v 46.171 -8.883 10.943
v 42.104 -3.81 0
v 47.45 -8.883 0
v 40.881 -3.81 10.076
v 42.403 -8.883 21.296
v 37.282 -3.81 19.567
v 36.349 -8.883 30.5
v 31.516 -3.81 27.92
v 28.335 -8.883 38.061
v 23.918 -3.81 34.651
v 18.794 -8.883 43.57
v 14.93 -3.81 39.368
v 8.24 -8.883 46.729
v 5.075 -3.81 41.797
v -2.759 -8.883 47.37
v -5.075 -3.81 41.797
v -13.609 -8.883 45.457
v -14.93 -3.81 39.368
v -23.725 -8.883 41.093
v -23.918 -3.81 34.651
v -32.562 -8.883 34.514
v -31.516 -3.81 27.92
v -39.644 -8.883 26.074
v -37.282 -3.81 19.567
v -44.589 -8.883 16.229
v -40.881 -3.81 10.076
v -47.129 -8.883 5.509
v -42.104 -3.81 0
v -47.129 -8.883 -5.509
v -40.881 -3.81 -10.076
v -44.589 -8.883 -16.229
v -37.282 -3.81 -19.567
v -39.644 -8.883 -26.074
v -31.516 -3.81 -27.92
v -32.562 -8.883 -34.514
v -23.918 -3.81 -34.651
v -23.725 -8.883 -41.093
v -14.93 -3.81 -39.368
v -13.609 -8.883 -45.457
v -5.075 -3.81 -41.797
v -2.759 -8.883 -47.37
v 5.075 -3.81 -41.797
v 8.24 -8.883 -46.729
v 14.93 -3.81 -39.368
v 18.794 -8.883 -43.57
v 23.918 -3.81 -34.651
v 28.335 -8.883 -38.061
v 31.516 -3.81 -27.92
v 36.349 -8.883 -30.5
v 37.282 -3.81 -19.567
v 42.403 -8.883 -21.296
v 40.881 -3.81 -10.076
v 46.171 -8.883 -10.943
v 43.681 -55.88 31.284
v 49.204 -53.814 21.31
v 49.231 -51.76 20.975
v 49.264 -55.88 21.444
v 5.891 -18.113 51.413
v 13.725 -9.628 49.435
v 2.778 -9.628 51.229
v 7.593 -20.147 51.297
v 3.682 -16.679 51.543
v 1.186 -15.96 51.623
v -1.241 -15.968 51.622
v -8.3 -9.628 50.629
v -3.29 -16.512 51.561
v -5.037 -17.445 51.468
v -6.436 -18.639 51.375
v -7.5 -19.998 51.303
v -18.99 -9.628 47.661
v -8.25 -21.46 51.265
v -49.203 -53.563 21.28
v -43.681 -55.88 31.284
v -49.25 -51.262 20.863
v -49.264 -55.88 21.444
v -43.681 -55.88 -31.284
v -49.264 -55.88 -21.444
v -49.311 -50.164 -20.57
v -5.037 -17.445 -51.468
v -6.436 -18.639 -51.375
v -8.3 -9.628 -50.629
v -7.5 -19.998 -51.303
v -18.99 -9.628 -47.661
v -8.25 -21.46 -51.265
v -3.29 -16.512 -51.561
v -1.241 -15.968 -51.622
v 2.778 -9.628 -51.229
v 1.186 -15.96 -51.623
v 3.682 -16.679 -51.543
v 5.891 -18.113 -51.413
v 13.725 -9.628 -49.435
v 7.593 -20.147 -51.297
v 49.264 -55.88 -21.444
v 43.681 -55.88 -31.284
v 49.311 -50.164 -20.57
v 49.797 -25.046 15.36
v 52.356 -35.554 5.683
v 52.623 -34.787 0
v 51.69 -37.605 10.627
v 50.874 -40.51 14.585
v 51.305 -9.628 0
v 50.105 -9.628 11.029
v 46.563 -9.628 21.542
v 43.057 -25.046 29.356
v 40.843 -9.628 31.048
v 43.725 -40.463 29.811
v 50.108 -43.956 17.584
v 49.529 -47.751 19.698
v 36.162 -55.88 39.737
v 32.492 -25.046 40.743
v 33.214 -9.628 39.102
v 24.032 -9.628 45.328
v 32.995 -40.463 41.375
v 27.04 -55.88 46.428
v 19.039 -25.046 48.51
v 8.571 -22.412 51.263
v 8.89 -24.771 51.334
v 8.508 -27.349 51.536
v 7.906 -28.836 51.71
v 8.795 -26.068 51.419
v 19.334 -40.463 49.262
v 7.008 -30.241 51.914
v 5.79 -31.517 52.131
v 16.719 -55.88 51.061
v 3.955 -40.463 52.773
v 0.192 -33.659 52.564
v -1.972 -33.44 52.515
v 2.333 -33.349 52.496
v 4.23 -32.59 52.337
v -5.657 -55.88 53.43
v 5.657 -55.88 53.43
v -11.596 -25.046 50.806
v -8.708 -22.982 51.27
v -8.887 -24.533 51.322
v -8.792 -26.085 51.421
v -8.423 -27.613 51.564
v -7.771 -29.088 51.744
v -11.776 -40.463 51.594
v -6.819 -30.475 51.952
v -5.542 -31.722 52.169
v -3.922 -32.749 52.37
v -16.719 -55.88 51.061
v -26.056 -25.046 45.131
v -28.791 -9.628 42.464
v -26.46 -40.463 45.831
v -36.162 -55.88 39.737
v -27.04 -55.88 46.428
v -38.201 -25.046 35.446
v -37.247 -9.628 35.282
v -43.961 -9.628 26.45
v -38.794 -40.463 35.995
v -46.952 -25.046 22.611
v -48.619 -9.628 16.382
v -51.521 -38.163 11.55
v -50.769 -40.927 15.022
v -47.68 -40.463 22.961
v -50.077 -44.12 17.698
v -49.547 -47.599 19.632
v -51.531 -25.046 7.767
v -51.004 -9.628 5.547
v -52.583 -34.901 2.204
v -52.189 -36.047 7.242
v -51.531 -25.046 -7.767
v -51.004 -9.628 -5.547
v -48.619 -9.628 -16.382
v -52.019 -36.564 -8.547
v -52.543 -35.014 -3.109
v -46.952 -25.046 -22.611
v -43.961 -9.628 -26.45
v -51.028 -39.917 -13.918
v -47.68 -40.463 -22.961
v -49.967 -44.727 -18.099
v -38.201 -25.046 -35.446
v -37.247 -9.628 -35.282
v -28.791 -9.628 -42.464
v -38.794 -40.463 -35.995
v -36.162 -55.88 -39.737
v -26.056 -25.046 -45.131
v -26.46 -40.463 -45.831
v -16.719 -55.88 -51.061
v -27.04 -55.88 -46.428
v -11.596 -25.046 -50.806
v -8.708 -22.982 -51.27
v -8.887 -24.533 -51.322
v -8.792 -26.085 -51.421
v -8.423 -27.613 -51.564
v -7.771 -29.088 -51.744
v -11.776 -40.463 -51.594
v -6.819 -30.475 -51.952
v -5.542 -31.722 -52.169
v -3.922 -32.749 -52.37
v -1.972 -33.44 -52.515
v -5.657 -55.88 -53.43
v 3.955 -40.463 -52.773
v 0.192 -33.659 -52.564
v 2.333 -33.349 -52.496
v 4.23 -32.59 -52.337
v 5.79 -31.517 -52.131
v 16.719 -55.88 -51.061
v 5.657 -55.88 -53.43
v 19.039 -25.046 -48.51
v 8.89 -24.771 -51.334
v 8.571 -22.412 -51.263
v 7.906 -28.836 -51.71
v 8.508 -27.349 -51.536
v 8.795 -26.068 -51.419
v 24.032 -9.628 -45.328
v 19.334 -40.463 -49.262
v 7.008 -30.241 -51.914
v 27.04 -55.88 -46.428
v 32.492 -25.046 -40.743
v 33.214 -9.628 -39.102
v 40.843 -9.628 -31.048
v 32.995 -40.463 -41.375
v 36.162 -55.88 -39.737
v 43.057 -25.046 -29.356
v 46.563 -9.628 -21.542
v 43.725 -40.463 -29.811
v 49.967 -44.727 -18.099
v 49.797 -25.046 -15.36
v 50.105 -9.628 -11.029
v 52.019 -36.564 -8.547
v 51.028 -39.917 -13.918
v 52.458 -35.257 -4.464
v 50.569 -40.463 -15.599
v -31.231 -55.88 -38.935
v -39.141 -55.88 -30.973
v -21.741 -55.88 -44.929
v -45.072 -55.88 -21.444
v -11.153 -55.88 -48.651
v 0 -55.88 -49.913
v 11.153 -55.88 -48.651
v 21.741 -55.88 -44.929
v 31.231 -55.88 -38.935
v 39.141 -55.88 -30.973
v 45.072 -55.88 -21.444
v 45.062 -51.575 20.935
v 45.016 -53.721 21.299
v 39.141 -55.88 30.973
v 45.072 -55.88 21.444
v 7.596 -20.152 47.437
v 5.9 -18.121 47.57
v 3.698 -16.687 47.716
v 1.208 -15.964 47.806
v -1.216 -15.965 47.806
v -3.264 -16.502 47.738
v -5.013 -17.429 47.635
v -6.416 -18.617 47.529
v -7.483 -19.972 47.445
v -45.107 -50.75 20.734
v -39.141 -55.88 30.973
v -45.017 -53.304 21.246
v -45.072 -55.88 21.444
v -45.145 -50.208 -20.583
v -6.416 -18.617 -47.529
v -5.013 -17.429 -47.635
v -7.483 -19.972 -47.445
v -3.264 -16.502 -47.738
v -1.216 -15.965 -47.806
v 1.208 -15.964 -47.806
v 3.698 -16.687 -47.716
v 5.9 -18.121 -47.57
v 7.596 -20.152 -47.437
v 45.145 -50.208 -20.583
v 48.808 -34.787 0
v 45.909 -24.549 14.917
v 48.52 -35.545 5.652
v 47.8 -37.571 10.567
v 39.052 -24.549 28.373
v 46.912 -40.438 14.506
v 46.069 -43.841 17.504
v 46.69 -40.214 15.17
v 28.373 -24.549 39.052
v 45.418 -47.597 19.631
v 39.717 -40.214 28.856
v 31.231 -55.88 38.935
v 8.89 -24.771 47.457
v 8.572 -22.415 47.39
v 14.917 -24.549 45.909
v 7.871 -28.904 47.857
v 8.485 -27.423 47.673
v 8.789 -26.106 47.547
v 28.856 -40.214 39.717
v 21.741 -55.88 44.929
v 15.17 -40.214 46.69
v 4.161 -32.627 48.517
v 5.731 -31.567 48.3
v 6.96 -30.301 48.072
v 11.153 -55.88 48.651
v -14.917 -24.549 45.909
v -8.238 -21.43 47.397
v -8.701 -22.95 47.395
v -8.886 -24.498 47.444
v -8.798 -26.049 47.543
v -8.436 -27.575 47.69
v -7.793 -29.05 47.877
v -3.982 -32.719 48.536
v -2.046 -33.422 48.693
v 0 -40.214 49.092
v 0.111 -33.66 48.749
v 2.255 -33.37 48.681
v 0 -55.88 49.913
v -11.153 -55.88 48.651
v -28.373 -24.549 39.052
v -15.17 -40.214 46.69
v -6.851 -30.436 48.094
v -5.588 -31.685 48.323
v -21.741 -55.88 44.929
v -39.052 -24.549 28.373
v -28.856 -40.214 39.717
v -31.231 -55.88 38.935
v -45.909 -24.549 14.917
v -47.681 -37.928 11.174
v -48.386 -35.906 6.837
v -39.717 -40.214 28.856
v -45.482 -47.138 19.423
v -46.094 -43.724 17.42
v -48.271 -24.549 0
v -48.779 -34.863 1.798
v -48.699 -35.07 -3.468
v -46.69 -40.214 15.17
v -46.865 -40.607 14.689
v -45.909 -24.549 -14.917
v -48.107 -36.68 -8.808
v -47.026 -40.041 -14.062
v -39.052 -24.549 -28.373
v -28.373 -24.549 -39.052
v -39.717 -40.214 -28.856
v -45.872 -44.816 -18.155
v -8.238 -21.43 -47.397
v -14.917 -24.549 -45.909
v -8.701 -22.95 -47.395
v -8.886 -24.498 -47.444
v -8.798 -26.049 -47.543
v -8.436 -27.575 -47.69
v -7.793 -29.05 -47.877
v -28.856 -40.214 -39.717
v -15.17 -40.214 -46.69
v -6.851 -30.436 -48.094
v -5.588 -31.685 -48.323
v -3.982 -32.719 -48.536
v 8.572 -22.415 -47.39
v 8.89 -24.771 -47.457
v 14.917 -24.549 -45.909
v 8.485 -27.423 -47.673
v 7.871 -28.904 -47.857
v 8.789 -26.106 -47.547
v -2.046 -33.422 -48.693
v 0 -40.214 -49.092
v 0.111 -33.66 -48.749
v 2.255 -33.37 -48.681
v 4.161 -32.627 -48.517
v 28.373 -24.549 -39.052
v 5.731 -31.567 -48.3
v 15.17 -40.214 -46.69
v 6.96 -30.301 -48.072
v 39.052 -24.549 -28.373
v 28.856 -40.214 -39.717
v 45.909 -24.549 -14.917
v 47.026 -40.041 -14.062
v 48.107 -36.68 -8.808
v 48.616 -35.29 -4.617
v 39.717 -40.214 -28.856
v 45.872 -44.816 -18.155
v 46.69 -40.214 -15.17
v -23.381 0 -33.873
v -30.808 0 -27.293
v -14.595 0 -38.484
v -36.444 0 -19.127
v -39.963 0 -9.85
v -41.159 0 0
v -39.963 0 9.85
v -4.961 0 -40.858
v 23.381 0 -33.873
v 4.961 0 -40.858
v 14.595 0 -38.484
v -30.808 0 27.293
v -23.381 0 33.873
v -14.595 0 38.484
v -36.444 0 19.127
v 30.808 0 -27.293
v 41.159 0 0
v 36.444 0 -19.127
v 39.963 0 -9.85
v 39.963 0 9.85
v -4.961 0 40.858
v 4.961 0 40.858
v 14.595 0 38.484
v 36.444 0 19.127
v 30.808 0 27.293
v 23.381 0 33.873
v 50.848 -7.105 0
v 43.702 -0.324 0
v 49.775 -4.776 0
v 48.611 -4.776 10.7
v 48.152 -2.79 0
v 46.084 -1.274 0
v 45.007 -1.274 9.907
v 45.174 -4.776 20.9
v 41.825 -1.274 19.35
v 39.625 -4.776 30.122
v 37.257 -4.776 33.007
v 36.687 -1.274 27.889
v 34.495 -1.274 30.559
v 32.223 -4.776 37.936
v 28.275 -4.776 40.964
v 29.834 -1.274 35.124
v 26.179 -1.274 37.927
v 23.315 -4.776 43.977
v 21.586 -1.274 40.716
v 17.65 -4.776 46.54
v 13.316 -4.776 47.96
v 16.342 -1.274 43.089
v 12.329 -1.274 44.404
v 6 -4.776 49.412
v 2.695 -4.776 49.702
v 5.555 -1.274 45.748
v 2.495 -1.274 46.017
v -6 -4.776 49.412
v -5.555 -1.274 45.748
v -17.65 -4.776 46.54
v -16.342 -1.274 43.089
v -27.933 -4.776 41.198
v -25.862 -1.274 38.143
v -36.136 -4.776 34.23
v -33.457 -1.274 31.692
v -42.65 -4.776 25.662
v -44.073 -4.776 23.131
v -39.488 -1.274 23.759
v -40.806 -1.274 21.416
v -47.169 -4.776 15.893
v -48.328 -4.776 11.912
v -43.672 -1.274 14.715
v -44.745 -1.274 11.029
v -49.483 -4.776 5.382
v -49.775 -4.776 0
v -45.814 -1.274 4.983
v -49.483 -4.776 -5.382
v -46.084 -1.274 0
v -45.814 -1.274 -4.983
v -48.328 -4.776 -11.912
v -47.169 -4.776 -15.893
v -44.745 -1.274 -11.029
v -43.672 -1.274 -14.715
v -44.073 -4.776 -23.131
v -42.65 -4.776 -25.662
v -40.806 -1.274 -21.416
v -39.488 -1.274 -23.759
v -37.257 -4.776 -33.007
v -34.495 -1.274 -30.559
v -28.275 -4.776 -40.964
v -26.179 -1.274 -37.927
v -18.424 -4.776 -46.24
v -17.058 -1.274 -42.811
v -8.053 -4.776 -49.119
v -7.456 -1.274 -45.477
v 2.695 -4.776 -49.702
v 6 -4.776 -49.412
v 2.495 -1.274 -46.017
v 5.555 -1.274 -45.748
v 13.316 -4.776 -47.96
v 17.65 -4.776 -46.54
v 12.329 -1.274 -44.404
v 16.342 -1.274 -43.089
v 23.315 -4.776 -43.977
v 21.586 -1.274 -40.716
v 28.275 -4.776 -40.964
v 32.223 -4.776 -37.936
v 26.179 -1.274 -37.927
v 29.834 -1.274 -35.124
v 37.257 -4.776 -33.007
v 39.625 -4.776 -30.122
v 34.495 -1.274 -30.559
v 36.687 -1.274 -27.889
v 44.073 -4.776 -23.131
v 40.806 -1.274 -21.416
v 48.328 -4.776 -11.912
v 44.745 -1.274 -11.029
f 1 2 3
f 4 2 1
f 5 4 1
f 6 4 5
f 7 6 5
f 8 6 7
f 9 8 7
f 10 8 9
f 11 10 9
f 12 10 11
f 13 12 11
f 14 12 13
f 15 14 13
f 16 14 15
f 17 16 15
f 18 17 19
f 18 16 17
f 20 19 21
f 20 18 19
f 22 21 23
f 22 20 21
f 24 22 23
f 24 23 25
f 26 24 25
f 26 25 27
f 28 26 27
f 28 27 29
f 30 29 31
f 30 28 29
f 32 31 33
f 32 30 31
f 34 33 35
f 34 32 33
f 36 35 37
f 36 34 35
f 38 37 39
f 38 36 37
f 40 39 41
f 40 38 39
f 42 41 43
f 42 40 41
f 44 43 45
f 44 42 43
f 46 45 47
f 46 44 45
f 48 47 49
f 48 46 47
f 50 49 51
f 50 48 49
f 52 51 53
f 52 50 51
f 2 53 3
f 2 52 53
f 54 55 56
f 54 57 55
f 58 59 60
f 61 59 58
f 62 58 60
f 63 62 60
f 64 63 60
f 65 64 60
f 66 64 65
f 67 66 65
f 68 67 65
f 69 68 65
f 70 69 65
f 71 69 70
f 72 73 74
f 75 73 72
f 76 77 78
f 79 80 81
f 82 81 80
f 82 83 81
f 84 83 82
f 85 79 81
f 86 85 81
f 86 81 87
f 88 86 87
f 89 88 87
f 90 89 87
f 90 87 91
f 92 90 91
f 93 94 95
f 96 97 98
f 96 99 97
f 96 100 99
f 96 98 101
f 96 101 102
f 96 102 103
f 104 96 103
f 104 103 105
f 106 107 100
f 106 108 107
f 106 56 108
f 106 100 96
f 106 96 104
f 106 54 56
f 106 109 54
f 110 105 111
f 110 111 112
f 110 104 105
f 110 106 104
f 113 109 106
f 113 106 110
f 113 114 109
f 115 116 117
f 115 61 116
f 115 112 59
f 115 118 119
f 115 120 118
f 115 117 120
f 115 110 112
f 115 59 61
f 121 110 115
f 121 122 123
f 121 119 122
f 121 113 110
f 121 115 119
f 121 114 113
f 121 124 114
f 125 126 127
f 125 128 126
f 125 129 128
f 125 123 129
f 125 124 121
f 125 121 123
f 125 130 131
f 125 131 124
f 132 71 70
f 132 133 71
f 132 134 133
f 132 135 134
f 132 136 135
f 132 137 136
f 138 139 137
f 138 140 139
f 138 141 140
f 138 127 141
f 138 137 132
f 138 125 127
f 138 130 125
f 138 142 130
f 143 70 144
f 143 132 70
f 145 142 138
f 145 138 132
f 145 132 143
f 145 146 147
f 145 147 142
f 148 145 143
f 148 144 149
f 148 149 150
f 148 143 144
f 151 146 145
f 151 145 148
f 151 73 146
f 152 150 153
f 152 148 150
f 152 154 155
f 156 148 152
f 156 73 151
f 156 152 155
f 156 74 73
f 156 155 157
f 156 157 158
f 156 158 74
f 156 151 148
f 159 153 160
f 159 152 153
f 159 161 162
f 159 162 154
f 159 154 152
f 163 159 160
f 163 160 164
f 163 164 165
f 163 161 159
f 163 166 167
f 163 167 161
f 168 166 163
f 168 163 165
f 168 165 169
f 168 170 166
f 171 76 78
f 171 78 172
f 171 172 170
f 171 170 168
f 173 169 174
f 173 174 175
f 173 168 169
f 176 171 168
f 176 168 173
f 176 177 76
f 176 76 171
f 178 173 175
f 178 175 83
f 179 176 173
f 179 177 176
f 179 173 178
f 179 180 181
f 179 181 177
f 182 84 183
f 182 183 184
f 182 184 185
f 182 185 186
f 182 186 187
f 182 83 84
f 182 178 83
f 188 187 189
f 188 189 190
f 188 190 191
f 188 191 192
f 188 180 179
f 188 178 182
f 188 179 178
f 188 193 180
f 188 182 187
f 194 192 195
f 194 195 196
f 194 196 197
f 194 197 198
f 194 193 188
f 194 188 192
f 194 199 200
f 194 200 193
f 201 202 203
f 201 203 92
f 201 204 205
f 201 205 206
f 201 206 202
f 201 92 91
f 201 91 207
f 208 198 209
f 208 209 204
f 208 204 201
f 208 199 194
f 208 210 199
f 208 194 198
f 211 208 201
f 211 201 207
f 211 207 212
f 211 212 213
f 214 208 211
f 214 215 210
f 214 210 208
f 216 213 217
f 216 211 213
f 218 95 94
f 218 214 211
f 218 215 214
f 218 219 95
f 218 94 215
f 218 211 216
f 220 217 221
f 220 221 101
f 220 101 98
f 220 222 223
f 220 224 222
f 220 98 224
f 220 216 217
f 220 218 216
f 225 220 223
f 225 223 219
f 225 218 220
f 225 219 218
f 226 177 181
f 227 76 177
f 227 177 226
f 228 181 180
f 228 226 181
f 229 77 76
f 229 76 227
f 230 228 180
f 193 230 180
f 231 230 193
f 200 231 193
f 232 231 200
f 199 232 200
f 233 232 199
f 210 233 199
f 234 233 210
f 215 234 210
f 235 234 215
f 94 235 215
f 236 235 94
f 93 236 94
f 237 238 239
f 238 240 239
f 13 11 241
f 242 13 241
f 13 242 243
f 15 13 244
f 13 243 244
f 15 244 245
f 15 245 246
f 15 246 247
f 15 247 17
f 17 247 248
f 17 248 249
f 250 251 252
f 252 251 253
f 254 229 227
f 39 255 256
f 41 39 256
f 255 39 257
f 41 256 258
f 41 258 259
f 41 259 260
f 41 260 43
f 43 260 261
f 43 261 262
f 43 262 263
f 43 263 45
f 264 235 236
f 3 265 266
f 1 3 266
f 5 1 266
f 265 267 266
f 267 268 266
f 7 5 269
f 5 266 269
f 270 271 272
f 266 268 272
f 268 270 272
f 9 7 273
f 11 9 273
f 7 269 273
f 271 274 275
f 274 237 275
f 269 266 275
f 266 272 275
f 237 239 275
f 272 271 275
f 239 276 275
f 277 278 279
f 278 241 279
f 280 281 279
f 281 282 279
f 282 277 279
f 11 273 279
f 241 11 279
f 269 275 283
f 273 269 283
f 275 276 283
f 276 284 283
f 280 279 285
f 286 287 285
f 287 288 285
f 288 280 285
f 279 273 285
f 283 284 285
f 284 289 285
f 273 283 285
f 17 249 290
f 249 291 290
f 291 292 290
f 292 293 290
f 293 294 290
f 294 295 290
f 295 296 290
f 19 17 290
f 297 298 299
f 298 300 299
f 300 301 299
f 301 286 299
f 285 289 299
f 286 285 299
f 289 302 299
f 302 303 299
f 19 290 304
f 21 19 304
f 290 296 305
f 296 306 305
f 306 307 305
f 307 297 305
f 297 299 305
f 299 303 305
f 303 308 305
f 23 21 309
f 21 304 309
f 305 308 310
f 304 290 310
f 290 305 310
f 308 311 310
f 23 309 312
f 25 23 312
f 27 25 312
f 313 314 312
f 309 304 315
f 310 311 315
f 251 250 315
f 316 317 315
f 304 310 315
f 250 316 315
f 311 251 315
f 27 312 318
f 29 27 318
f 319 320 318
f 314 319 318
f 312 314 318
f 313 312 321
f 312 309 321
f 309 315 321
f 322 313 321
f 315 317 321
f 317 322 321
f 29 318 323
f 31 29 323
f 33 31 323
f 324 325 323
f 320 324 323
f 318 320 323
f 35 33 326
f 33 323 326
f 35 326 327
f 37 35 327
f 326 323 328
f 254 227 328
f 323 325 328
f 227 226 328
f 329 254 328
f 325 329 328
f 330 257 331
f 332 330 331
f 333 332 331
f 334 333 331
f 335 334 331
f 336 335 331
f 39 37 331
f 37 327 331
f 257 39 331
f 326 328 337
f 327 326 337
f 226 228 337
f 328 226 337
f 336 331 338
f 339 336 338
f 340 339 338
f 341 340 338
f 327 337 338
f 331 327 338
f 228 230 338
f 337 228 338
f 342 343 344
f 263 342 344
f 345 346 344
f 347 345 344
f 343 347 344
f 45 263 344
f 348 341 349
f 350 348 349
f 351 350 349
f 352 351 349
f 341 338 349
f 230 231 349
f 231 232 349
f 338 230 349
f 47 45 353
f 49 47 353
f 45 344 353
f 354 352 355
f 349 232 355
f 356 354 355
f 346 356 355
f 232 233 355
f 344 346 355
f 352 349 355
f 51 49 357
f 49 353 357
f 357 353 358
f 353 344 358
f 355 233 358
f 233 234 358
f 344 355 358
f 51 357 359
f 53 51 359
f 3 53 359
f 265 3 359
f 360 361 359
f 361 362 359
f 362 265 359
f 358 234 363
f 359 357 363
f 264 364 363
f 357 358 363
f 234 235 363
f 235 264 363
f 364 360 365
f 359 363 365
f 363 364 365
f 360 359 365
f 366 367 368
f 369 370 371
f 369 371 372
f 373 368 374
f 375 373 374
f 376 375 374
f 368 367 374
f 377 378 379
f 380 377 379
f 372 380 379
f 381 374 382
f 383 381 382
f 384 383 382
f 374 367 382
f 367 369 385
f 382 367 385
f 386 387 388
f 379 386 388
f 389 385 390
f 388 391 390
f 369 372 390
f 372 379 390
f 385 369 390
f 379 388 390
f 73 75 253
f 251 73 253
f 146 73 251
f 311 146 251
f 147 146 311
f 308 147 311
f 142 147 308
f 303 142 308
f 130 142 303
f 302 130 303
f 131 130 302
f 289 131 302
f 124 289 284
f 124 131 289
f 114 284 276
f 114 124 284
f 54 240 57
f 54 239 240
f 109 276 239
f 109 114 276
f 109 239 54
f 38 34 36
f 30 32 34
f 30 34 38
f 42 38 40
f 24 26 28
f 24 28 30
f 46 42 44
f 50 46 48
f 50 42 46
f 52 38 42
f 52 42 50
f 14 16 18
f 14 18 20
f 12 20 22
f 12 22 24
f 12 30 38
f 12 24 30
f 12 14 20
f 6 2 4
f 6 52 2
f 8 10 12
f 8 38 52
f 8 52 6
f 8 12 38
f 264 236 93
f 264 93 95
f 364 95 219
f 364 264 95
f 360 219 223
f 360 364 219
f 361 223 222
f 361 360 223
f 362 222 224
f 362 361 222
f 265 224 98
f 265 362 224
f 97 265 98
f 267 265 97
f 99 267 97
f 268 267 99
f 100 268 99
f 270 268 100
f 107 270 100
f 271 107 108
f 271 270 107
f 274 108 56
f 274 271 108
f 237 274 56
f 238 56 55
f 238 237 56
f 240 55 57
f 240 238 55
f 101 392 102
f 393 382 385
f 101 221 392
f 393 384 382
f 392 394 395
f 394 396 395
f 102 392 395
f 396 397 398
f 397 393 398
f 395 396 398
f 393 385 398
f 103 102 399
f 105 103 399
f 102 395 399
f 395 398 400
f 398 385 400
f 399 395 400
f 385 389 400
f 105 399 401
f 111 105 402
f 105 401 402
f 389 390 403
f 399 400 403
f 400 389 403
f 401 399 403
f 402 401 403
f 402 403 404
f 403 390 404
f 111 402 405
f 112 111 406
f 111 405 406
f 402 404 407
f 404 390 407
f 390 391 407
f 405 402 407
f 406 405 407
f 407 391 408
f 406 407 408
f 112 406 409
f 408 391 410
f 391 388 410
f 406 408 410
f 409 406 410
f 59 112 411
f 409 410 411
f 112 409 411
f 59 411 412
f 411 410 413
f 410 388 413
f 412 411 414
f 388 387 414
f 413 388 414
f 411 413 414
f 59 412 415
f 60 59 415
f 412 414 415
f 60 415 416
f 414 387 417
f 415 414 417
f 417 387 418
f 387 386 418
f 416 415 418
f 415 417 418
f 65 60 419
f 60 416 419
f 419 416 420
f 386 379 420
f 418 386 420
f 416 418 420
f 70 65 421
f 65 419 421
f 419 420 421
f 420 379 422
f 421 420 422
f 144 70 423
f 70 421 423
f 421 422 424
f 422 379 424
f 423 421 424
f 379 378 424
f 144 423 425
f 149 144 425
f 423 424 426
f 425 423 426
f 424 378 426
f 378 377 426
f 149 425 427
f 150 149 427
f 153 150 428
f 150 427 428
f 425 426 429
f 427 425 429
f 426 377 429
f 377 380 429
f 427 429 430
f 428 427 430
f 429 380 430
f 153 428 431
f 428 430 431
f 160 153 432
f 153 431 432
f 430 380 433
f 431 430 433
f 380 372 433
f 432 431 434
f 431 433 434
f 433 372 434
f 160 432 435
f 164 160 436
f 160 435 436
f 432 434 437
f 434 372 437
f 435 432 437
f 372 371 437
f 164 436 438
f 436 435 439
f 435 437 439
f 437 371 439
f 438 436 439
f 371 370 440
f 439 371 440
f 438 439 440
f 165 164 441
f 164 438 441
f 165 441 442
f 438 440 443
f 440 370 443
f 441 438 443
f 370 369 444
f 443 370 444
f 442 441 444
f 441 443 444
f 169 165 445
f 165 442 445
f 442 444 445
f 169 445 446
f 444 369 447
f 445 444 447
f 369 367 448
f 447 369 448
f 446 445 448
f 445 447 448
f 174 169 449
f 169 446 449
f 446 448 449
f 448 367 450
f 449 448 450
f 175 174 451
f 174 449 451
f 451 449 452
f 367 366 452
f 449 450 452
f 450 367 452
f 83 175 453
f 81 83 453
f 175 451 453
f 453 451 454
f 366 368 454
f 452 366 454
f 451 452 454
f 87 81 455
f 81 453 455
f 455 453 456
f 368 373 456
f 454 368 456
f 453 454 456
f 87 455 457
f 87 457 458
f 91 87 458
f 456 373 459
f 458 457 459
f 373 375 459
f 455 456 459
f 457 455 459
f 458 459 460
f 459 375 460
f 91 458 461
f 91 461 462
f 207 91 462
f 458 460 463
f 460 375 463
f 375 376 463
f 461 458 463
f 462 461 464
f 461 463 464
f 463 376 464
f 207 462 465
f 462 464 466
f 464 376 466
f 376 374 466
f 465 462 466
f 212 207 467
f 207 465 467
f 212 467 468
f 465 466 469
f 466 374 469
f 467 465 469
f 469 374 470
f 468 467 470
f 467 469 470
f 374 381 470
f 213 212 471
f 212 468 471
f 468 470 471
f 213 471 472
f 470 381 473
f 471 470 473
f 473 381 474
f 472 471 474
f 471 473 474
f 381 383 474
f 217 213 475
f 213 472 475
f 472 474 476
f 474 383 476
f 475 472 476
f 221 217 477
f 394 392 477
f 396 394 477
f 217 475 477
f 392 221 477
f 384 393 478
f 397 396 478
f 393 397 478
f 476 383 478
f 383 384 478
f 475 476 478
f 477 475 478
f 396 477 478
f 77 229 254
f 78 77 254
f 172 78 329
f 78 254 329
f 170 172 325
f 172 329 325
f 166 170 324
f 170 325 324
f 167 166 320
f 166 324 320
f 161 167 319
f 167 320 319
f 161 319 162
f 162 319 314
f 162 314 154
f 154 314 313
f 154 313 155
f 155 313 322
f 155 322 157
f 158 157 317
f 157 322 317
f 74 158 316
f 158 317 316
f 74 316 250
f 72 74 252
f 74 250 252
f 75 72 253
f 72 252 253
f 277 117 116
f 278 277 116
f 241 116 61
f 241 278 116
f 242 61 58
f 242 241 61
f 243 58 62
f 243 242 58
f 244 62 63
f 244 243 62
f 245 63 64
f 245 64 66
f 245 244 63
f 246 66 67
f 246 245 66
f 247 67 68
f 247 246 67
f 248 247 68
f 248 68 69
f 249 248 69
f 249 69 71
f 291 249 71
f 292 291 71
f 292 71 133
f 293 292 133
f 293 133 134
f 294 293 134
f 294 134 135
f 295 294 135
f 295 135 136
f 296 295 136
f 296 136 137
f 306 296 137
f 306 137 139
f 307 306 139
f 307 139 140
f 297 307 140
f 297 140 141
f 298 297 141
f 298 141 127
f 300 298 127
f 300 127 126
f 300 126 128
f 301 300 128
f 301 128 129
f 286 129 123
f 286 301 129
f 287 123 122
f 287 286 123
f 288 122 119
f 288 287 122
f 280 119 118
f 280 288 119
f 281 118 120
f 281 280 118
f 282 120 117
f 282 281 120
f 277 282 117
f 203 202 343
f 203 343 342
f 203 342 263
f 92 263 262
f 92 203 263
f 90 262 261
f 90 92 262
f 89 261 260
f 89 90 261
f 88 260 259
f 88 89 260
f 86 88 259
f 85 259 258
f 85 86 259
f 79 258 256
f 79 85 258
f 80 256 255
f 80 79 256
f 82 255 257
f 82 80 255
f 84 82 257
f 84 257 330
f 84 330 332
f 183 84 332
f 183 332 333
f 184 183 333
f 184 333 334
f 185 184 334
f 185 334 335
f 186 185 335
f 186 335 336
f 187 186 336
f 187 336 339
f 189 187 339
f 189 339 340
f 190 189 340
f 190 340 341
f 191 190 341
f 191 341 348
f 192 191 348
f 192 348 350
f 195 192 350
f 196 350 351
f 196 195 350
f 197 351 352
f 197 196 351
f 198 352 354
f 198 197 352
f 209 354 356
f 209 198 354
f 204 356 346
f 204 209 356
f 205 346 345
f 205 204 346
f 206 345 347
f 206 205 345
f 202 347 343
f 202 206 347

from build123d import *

# Parameters (mm, degrees)
F0_R          = 50.8
F1_DEPTH      = 55.88
F1_TAPER      = -3
F2_T          = -3.81
F4_R          = 21.44690309
F5_DEPTH      = 58.166
F5_DEPTH_BACK = 65.786
F6_R          = 10.16
F7_SIZE       = 5.08
F9_R          = 8.89
F10_DEPTH     = 133.858


with BuildPart() as f1:
    # F0 (on Front) → F1 (new body)
    with BuildSketch(Plane.XZ):
        Circle(F0_R)
    extrude(amount=F1_DEPTH, taper=F1_TAPER)

    # F2
    f2_openings = [f1.faces().sort_by_distance(p)[0] for p in [
        (0, -55.88, 0),
    ]]
    offset(amount=F2_T, openings=f2_openings, kind=Kind.INTERSECTION)

    # F4 (on Right) → F5 (cut, two sides)
    with BuildSketch(Plane.YZ) as f5_sk:
        with Locations((-56.2342293561, 0)):
            Circle(F4_R)
    extrude(amount=-F5_DEPTH, mode=Mode.SUBTRACT)
    extrude(f5_sk.sketch, amount=F5_DEPTH_BACK, mode=Mode.SUBTRACT)

    # F6
    f6_edges = [f1.edges().sort_by_distance(p)[0] for p in [
        (-50.8, 0, 0),
    ]]
    fillet(f6_edges, radius=F6_R)

    # F7
    f7_edges = [f1.edges().sort_by_distance(p)[0] for p in [
        (-47.184445, -3.81, 0),
    ]]
    chamfer(f7_edges, length=F7_SIZE)

    # F9 (on offset) → F10 (cut)
    with BuildSketch(Plane.XY.offset(-64.008)):
        with Locations((0, -24.771042074)):
            Circle(F9_R)
    extrude(amount=F10_DEPTH, mode=Mode.SUBTRACT)


solid = f1.part
